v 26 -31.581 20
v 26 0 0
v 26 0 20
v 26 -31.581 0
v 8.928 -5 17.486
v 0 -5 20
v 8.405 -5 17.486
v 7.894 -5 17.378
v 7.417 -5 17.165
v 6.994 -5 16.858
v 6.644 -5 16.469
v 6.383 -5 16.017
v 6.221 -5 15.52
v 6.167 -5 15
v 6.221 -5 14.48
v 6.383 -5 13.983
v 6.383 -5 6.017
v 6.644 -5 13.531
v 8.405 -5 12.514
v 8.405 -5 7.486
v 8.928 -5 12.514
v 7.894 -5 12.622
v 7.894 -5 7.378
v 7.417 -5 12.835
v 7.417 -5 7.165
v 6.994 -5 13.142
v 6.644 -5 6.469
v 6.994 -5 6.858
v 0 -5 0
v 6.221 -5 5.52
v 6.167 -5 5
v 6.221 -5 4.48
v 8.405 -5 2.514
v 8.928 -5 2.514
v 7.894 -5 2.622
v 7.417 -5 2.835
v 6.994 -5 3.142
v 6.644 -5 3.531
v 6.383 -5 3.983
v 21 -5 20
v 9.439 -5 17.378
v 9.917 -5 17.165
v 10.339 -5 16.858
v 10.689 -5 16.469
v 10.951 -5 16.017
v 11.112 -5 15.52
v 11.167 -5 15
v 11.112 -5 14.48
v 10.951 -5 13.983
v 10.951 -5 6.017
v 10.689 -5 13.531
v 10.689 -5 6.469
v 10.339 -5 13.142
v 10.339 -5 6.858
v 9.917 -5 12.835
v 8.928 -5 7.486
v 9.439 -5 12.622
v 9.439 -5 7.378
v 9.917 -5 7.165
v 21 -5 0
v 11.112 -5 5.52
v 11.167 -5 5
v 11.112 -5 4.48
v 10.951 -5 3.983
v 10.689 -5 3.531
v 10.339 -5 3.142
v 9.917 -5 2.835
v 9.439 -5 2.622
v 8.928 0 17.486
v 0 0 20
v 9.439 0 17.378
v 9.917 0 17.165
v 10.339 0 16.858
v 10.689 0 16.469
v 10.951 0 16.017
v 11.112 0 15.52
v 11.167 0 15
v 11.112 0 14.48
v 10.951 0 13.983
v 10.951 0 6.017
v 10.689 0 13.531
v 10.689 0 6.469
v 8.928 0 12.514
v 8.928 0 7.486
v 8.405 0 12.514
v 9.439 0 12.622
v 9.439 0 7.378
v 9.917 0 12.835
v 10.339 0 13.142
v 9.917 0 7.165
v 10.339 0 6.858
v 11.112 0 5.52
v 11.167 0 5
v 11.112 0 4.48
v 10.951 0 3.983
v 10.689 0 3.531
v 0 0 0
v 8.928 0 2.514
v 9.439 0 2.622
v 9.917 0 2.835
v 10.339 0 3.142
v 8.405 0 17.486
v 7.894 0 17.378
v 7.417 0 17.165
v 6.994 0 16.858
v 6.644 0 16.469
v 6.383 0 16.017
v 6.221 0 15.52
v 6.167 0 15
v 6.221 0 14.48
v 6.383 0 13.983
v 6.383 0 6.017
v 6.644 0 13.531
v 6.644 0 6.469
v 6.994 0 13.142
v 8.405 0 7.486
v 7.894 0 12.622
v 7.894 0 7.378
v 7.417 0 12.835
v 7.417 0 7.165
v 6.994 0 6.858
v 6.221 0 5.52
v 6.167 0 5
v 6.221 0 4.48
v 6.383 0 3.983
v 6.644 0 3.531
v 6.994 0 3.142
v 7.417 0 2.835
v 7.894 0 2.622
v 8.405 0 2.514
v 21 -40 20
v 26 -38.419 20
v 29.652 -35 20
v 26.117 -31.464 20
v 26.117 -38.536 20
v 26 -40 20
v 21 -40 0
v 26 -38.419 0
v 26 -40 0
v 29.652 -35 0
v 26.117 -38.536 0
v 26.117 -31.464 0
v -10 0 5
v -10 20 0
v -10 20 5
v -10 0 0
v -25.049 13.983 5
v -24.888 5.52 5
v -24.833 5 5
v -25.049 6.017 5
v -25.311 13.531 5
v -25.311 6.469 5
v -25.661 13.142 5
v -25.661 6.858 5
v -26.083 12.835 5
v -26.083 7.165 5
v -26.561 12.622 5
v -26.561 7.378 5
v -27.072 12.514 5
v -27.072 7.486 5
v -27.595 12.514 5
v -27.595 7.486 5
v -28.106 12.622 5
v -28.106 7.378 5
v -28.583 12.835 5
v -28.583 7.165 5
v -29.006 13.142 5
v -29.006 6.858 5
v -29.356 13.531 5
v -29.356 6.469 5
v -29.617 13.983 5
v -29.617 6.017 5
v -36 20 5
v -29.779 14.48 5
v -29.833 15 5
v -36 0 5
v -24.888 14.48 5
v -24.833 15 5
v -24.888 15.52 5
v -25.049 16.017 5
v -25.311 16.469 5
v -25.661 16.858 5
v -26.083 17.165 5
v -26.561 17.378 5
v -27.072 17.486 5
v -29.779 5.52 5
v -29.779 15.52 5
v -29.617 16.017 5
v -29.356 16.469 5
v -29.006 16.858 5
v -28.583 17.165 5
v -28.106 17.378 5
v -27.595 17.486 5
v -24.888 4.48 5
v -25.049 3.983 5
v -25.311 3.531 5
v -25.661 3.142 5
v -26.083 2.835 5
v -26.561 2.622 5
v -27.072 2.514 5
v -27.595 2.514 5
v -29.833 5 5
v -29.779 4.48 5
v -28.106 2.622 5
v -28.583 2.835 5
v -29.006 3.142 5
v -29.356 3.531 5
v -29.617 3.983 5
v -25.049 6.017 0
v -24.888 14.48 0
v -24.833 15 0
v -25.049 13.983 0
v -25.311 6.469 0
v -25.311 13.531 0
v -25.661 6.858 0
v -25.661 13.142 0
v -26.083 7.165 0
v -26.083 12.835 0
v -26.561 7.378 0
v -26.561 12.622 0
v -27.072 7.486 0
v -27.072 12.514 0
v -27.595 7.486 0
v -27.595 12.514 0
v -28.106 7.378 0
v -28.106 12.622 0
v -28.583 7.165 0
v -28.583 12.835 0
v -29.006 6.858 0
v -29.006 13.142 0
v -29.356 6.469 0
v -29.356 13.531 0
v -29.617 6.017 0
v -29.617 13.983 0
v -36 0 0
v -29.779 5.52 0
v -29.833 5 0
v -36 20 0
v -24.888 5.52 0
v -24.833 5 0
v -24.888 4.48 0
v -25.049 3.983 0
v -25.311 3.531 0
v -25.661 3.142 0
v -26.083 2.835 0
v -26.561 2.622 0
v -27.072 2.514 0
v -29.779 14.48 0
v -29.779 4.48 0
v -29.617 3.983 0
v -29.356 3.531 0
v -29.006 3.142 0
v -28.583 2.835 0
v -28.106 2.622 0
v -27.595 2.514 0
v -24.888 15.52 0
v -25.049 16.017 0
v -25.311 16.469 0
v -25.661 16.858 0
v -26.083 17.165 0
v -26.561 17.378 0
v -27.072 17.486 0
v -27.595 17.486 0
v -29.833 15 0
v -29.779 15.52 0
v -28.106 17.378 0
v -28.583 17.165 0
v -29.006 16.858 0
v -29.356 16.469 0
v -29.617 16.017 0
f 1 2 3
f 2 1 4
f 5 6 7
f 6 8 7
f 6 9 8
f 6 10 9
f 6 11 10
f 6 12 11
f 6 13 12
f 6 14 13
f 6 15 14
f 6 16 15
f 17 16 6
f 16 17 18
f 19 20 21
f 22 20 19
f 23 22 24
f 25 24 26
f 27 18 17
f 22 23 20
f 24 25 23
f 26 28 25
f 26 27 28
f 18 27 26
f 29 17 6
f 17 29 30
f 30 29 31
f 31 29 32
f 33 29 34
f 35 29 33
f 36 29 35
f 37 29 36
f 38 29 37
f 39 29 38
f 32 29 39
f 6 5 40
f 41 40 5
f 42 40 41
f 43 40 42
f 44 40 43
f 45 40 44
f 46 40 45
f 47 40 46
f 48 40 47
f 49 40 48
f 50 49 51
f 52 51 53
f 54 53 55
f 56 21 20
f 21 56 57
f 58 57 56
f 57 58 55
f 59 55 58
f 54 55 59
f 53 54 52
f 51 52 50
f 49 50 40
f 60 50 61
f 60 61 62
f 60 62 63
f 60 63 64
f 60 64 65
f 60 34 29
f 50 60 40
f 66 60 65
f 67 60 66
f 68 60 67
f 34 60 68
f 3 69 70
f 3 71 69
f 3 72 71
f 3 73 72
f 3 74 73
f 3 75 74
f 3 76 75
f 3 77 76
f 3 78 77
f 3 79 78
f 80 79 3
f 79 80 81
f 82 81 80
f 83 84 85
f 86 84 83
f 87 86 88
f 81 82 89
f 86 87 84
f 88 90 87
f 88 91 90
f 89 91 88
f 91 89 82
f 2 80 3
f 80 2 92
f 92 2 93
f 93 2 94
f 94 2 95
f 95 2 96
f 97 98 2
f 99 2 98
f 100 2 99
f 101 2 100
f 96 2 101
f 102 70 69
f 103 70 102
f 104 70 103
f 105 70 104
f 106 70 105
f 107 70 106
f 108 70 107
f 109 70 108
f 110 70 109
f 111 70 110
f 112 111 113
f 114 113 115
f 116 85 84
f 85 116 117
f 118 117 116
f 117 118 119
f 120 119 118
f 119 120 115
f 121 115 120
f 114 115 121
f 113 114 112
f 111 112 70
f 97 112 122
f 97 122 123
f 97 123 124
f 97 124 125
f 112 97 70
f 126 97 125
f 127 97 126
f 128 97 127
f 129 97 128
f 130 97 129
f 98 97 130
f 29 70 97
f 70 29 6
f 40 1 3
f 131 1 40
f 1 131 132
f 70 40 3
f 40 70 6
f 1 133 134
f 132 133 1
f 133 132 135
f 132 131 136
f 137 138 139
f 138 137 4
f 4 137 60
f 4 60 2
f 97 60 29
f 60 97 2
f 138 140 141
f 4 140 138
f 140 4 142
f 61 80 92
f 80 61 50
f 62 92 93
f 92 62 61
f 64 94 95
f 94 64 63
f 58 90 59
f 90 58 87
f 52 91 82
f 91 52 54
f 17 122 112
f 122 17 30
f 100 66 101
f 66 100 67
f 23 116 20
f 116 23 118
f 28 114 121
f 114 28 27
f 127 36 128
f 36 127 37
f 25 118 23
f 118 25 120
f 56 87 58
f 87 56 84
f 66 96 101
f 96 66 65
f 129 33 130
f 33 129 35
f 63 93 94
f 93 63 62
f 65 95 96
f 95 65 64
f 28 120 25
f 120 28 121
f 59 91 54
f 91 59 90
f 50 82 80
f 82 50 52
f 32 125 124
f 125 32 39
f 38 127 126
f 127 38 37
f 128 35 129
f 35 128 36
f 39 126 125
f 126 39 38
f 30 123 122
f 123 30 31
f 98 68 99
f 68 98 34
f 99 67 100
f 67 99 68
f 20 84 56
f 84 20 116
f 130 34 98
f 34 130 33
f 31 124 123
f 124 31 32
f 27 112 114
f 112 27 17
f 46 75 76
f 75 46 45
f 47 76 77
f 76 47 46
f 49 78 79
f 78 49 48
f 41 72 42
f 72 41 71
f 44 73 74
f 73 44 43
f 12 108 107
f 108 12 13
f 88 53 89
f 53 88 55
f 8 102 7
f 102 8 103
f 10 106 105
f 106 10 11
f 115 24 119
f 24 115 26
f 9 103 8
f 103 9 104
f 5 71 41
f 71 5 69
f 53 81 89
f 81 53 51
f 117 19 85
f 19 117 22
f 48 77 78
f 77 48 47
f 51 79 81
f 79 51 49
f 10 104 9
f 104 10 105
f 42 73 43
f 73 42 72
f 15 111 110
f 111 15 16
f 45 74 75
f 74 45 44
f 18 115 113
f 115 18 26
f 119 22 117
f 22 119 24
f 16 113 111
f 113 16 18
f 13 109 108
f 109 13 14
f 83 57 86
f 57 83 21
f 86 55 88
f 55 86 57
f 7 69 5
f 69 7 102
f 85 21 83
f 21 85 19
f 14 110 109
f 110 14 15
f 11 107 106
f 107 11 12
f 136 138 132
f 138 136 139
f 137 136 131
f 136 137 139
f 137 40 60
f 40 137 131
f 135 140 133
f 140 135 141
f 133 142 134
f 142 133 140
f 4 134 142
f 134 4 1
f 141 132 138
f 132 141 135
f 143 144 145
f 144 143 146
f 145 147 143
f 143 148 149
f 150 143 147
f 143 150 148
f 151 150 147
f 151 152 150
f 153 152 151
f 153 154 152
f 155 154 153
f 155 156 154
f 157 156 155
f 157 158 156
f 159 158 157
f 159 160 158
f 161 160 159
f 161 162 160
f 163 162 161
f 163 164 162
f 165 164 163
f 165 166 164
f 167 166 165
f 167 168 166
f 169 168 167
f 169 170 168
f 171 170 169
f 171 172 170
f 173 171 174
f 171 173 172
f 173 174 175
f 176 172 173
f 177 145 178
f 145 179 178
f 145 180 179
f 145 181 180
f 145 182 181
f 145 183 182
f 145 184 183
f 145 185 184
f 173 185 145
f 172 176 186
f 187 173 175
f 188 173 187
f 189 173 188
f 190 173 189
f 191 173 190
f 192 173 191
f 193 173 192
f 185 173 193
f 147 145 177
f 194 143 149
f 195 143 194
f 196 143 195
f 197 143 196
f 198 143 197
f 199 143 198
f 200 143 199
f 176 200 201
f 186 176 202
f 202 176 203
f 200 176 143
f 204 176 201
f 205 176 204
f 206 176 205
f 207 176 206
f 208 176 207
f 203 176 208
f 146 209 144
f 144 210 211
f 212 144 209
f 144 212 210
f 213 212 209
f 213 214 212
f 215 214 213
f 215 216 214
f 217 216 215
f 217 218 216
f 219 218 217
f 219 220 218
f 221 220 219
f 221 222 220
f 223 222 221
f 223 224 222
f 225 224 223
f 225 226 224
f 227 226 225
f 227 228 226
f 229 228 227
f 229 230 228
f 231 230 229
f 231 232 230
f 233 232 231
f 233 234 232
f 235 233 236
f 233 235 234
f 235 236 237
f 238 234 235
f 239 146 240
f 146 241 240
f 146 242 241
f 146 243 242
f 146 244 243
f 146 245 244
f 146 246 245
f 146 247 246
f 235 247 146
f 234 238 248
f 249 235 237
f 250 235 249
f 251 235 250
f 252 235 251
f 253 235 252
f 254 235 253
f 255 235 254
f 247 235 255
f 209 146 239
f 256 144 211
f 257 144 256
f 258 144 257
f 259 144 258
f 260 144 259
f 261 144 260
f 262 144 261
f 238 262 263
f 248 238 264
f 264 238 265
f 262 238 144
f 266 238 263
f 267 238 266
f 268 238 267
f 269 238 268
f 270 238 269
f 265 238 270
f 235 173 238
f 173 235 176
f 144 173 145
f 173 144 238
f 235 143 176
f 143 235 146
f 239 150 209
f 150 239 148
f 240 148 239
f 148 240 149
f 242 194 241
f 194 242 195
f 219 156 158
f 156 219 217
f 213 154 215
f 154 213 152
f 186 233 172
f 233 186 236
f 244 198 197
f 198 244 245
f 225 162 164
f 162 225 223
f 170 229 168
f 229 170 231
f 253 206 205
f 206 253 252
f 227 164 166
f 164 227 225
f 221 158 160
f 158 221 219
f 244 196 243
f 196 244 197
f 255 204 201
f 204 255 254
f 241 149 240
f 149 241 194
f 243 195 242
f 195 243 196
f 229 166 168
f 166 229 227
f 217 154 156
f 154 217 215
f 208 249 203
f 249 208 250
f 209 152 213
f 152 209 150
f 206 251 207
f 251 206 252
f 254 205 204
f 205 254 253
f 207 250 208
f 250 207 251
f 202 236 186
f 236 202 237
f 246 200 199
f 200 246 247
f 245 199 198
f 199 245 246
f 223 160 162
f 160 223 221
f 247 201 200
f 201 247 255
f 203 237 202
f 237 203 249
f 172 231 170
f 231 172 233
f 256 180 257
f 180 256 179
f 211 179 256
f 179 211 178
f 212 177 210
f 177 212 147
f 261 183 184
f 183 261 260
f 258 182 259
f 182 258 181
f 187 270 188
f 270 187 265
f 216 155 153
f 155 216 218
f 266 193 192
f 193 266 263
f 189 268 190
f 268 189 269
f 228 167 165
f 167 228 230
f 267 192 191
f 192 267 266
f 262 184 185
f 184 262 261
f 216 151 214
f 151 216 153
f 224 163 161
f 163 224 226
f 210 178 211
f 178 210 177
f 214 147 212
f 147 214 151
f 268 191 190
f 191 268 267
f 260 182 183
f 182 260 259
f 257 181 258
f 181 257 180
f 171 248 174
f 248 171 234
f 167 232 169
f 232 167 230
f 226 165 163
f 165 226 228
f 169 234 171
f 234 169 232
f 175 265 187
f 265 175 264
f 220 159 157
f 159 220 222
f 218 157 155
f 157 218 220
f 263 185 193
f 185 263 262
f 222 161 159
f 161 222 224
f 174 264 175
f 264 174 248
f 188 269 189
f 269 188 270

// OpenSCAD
$fn=30;
length=40;
a1=20;
a2=26;
thick=5;
hole=5; //mounting holes diameter

//hook
rotate([90,0,0]) {
    //mounting plate
    difference() {
        cube([a2,a1,thick]);
        translate([a2/3,hole,-thick/4])
        cylinder(thick*2,hole/2,hole/2);
        translate([a2/3,a1-hole,-thick/4])
        cylinder(thick*2,hole/2,hole/2);
    }
    //up
    translate([a2-thick,0,0]) {
        cube([thick,a1,length]);
        //edge
        movex=sqrt(2*thick)/2;
        translate([movex,0,length-thick]) {
            rotate([0,45,0]) {
                cube([thick,a1,thick]);
            }
        }
    }
}


//retaining plate
translate([-a2-10,0,0]) {
    difference() {
        cube([a2,a1,thick]);
        translate([a2/3,hole,-2])
        cylinder(thick*2,hole/2,hole/2);
        translate([a2/3,a1-hole,-2])
        cylinder(thick*2,hole/2,hole/2);
    }
}
